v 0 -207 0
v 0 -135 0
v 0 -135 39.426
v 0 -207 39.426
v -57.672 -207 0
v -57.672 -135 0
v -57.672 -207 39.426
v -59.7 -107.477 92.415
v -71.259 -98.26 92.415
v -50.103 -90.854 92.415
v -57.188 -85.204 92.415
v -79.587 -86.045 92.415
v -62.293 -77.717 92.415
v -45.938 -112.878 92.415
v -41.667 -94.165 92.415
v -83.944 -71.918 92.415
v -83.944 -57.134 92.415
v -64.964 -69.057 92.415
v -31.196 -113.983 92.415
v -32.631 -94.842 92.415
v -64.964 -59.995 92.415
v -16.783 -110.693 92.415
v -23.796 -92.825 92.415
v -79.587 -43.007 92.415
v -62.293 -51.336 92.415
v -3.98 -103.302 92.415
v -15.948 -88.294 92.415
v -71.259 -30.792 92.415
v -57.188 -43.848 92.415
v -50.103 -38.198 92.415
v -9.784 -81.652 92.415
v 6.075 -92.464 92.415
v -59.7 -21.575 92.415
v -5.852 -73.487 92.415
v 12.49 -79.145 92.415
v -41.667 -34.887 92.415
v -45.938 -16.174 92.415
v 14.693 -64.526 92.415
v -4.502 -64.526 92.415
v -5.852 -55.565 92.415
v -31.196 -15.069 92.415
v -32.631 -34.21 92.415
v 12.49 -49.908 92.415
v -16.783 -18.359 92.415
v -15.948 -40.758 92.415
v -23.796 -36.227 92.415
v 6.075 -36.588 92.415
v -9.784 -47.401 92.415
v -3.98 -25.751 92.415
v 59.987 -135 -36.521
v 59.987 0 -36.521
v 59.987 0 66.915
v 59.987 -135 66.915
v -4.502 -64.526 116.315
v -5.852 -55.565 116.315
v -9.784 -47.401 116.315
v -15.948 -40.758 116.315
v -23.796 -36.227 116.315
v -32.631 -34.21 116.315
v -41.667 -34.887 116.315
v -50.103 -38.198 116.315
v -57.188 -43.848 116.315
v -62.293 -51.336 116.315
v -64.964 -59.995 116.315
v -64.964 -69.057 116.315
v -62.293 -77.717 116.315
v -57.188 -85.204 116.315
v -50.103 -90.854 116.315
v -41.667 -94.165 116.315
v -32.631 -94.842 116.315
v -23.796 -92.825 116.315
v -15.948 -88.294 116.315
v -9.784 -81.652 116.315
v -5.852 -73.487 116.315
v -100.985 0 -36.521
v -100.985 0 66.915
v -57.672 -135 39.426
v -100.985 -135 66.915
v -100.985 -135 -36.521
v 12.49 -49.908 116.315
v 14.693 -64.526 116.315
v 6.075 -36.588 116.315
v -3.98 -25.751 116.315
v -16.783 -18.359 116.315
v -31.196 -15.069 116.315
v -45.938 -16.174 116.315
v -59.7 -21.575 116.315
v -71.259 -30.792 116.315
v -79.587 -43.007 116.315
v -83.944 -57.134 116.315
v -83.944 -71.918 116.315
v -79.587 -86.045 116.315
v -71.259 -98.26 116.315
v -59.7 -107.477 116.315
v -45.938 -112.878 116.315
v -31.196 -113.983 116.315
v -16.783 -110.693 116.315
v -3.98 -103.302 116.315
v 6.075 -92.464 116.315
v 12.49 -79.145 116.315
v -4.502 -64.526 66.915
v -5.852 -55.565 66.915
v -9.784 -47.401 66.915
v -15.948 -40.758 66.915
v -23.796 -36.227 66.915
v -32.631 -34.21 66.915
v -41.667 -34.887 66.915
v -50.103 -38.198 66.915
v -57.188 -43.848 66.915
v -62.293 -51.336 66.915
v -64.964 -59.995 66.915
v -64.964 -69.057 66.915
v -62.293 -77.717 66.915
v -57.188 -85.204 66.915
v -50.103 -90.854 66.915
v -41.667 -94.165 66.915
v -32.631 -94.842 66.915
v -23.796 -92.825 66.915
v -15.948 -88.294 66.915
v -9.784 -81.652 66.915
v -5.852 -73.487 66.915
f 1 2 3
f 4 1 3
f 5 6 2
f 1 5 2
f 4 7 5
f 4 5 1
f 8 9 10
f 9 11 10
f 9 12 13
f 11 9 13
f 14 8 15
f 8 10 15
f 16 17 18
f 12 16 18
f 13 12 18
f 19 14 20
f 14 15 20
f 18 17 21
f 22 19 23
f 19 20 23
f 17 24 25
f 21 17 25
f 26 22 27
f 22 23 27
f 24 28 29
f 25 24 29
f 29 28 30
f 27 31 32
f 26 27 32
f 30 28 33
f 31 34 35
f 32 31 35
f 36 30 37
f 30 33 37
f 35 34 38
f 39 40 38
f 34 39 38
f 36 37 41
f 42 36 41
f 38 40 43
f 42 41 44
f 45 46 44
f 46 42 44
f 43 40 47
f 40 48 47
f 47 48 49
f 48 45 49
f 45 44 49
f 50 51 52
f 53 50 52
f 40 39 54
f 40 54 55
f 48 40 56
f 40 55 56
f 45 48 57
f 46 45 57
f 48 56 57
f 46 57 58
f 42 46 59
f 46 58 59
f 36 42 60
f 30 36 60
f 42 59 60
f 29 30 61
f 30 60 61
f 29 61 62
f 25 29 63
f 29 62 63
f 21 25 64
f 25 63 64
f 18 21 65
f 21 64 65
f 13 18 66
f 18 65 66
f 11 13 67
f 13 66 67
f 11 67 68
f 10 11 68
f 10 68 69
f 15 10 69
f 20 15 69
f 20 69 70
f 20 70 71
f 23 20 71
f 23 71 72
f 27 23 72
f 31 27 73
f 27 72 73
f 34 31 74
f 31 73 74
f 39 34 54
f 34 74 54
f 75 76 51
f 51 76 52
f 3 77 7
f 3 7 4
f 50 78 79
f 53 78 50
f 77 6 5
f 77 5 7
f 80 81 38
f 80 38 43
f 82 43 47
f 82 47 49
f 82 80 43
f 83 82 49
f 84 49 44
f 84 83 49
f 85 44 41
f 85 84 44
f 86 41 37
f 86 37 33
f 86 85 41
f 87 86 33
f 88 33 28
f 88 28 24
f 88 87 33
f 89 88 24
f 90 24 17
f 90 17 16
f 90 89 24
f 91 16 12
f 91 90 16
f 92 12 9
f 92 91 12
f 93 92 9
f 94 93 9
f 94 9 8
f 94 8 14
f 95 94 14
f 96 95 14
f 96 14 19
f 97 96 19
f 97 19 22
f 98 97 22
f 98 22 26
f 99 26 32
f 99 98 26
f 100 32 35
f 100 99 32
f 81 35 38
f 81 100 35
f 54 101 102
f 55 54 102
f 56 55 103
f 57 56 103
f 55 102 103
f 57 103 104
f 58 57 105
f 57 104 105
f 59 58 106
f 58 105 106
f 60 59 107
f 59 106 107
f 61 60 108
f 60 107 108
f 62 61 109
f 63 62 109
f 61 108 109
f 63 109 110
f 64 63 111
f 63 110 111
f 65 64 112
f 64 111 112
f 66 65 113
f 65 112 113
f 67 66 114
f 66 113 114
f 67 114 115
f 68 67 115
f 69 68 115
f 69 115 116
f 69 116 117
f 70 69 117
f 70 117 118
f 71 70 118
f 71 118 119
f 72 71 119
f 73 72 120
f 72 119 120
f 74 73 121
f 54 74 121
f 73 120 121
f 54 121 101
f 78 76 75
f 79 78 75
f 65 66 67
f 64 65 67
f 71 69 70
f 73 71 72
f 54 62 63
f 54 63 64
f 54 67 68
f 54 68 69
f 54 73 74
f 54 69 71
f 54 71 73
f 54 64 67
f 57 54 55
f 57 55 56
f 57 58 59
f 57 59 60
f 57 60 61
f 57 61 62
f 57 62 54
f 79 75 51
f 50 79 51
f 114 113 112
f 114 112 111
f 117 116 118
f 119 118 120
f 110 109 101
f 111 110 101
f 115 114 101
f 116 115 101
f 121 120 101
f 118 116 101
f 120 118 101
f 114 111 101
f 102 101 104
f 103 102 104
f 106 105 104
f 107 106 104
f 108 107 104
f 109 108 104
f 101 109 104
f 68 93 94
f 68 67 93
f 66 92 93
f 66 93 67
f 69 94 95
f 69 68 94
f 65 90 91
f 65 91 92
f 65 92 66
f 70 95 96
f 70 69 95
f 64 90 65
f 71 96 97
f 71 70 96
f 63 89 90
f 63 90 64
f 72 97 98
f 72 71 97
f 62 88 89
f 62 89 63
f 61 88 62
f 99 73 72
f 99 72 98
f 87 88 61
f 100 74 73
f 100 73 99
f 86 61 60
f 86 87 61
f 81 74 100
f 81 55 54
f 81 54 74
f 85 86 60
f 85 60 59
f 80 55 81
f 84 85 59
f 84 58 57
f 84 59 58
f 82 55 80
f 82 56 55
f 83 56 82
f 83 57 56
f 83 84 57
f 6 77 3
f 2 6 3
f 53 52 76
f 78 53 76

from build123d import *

# Parameters (mm, degrees)
F1_DEPTH = 135
F2_W     = 57.671525
F2_H     = 39.425988
F3_DEPTH = 72
F4_R     = 30.400853
F5_DEPTH = 49.4
F6_R     = 49.595706
F6_R_2   = 30.400853
F7_DEPTH = 23.9


with BuildPart() as f1:
    # F0 (on Front) → F1 (new body)
    with BuildSketch(Plane.XZ):
        Polygon((59.986742, 66.914834), (-100.985013, 66.914834), (-100.985013, -36.521275), (59.986742, -36.521275), (59.986742, 15.19678), align=None)
    extrude(amount=F1_DEPTH)


with BuildPart() as f3:
    # F2 (on face) → F3 (new body)
    with BuildSketch(Plane.XZ.offset(135)):
        with Locations((-28.835762, 19.712994)):
            Rectangle(F2_W, F2_H)
    extrude(amount=F3_DEPTH)


with BuildPart() as f5:
    # F4 (on face) → F5 (new body)
    with BuildSketch(Plane.XY.offset(66.914834)):
        with Locations((-34.902398, -64.526096)):
            Circle(F4_R)
    extrude(amount=F5_DEPTH)


with BuildPart() as f7:
    # F6 (on face) → F7 (new body)
    with BuildSketch(Plane.XY.offset(116.314834)):
        with Locations((-34.902398, -64.526096)):
            Circle(F6_R)
        with Locations((-34.902398, -64.526096)):
            Circle(F6_R_2, mode=Mode.SUBTRACT)
    extrude(amount=-F7_DEPTH)


solid = Compound([f1.part, f3.part, f5.part, f7.part])
